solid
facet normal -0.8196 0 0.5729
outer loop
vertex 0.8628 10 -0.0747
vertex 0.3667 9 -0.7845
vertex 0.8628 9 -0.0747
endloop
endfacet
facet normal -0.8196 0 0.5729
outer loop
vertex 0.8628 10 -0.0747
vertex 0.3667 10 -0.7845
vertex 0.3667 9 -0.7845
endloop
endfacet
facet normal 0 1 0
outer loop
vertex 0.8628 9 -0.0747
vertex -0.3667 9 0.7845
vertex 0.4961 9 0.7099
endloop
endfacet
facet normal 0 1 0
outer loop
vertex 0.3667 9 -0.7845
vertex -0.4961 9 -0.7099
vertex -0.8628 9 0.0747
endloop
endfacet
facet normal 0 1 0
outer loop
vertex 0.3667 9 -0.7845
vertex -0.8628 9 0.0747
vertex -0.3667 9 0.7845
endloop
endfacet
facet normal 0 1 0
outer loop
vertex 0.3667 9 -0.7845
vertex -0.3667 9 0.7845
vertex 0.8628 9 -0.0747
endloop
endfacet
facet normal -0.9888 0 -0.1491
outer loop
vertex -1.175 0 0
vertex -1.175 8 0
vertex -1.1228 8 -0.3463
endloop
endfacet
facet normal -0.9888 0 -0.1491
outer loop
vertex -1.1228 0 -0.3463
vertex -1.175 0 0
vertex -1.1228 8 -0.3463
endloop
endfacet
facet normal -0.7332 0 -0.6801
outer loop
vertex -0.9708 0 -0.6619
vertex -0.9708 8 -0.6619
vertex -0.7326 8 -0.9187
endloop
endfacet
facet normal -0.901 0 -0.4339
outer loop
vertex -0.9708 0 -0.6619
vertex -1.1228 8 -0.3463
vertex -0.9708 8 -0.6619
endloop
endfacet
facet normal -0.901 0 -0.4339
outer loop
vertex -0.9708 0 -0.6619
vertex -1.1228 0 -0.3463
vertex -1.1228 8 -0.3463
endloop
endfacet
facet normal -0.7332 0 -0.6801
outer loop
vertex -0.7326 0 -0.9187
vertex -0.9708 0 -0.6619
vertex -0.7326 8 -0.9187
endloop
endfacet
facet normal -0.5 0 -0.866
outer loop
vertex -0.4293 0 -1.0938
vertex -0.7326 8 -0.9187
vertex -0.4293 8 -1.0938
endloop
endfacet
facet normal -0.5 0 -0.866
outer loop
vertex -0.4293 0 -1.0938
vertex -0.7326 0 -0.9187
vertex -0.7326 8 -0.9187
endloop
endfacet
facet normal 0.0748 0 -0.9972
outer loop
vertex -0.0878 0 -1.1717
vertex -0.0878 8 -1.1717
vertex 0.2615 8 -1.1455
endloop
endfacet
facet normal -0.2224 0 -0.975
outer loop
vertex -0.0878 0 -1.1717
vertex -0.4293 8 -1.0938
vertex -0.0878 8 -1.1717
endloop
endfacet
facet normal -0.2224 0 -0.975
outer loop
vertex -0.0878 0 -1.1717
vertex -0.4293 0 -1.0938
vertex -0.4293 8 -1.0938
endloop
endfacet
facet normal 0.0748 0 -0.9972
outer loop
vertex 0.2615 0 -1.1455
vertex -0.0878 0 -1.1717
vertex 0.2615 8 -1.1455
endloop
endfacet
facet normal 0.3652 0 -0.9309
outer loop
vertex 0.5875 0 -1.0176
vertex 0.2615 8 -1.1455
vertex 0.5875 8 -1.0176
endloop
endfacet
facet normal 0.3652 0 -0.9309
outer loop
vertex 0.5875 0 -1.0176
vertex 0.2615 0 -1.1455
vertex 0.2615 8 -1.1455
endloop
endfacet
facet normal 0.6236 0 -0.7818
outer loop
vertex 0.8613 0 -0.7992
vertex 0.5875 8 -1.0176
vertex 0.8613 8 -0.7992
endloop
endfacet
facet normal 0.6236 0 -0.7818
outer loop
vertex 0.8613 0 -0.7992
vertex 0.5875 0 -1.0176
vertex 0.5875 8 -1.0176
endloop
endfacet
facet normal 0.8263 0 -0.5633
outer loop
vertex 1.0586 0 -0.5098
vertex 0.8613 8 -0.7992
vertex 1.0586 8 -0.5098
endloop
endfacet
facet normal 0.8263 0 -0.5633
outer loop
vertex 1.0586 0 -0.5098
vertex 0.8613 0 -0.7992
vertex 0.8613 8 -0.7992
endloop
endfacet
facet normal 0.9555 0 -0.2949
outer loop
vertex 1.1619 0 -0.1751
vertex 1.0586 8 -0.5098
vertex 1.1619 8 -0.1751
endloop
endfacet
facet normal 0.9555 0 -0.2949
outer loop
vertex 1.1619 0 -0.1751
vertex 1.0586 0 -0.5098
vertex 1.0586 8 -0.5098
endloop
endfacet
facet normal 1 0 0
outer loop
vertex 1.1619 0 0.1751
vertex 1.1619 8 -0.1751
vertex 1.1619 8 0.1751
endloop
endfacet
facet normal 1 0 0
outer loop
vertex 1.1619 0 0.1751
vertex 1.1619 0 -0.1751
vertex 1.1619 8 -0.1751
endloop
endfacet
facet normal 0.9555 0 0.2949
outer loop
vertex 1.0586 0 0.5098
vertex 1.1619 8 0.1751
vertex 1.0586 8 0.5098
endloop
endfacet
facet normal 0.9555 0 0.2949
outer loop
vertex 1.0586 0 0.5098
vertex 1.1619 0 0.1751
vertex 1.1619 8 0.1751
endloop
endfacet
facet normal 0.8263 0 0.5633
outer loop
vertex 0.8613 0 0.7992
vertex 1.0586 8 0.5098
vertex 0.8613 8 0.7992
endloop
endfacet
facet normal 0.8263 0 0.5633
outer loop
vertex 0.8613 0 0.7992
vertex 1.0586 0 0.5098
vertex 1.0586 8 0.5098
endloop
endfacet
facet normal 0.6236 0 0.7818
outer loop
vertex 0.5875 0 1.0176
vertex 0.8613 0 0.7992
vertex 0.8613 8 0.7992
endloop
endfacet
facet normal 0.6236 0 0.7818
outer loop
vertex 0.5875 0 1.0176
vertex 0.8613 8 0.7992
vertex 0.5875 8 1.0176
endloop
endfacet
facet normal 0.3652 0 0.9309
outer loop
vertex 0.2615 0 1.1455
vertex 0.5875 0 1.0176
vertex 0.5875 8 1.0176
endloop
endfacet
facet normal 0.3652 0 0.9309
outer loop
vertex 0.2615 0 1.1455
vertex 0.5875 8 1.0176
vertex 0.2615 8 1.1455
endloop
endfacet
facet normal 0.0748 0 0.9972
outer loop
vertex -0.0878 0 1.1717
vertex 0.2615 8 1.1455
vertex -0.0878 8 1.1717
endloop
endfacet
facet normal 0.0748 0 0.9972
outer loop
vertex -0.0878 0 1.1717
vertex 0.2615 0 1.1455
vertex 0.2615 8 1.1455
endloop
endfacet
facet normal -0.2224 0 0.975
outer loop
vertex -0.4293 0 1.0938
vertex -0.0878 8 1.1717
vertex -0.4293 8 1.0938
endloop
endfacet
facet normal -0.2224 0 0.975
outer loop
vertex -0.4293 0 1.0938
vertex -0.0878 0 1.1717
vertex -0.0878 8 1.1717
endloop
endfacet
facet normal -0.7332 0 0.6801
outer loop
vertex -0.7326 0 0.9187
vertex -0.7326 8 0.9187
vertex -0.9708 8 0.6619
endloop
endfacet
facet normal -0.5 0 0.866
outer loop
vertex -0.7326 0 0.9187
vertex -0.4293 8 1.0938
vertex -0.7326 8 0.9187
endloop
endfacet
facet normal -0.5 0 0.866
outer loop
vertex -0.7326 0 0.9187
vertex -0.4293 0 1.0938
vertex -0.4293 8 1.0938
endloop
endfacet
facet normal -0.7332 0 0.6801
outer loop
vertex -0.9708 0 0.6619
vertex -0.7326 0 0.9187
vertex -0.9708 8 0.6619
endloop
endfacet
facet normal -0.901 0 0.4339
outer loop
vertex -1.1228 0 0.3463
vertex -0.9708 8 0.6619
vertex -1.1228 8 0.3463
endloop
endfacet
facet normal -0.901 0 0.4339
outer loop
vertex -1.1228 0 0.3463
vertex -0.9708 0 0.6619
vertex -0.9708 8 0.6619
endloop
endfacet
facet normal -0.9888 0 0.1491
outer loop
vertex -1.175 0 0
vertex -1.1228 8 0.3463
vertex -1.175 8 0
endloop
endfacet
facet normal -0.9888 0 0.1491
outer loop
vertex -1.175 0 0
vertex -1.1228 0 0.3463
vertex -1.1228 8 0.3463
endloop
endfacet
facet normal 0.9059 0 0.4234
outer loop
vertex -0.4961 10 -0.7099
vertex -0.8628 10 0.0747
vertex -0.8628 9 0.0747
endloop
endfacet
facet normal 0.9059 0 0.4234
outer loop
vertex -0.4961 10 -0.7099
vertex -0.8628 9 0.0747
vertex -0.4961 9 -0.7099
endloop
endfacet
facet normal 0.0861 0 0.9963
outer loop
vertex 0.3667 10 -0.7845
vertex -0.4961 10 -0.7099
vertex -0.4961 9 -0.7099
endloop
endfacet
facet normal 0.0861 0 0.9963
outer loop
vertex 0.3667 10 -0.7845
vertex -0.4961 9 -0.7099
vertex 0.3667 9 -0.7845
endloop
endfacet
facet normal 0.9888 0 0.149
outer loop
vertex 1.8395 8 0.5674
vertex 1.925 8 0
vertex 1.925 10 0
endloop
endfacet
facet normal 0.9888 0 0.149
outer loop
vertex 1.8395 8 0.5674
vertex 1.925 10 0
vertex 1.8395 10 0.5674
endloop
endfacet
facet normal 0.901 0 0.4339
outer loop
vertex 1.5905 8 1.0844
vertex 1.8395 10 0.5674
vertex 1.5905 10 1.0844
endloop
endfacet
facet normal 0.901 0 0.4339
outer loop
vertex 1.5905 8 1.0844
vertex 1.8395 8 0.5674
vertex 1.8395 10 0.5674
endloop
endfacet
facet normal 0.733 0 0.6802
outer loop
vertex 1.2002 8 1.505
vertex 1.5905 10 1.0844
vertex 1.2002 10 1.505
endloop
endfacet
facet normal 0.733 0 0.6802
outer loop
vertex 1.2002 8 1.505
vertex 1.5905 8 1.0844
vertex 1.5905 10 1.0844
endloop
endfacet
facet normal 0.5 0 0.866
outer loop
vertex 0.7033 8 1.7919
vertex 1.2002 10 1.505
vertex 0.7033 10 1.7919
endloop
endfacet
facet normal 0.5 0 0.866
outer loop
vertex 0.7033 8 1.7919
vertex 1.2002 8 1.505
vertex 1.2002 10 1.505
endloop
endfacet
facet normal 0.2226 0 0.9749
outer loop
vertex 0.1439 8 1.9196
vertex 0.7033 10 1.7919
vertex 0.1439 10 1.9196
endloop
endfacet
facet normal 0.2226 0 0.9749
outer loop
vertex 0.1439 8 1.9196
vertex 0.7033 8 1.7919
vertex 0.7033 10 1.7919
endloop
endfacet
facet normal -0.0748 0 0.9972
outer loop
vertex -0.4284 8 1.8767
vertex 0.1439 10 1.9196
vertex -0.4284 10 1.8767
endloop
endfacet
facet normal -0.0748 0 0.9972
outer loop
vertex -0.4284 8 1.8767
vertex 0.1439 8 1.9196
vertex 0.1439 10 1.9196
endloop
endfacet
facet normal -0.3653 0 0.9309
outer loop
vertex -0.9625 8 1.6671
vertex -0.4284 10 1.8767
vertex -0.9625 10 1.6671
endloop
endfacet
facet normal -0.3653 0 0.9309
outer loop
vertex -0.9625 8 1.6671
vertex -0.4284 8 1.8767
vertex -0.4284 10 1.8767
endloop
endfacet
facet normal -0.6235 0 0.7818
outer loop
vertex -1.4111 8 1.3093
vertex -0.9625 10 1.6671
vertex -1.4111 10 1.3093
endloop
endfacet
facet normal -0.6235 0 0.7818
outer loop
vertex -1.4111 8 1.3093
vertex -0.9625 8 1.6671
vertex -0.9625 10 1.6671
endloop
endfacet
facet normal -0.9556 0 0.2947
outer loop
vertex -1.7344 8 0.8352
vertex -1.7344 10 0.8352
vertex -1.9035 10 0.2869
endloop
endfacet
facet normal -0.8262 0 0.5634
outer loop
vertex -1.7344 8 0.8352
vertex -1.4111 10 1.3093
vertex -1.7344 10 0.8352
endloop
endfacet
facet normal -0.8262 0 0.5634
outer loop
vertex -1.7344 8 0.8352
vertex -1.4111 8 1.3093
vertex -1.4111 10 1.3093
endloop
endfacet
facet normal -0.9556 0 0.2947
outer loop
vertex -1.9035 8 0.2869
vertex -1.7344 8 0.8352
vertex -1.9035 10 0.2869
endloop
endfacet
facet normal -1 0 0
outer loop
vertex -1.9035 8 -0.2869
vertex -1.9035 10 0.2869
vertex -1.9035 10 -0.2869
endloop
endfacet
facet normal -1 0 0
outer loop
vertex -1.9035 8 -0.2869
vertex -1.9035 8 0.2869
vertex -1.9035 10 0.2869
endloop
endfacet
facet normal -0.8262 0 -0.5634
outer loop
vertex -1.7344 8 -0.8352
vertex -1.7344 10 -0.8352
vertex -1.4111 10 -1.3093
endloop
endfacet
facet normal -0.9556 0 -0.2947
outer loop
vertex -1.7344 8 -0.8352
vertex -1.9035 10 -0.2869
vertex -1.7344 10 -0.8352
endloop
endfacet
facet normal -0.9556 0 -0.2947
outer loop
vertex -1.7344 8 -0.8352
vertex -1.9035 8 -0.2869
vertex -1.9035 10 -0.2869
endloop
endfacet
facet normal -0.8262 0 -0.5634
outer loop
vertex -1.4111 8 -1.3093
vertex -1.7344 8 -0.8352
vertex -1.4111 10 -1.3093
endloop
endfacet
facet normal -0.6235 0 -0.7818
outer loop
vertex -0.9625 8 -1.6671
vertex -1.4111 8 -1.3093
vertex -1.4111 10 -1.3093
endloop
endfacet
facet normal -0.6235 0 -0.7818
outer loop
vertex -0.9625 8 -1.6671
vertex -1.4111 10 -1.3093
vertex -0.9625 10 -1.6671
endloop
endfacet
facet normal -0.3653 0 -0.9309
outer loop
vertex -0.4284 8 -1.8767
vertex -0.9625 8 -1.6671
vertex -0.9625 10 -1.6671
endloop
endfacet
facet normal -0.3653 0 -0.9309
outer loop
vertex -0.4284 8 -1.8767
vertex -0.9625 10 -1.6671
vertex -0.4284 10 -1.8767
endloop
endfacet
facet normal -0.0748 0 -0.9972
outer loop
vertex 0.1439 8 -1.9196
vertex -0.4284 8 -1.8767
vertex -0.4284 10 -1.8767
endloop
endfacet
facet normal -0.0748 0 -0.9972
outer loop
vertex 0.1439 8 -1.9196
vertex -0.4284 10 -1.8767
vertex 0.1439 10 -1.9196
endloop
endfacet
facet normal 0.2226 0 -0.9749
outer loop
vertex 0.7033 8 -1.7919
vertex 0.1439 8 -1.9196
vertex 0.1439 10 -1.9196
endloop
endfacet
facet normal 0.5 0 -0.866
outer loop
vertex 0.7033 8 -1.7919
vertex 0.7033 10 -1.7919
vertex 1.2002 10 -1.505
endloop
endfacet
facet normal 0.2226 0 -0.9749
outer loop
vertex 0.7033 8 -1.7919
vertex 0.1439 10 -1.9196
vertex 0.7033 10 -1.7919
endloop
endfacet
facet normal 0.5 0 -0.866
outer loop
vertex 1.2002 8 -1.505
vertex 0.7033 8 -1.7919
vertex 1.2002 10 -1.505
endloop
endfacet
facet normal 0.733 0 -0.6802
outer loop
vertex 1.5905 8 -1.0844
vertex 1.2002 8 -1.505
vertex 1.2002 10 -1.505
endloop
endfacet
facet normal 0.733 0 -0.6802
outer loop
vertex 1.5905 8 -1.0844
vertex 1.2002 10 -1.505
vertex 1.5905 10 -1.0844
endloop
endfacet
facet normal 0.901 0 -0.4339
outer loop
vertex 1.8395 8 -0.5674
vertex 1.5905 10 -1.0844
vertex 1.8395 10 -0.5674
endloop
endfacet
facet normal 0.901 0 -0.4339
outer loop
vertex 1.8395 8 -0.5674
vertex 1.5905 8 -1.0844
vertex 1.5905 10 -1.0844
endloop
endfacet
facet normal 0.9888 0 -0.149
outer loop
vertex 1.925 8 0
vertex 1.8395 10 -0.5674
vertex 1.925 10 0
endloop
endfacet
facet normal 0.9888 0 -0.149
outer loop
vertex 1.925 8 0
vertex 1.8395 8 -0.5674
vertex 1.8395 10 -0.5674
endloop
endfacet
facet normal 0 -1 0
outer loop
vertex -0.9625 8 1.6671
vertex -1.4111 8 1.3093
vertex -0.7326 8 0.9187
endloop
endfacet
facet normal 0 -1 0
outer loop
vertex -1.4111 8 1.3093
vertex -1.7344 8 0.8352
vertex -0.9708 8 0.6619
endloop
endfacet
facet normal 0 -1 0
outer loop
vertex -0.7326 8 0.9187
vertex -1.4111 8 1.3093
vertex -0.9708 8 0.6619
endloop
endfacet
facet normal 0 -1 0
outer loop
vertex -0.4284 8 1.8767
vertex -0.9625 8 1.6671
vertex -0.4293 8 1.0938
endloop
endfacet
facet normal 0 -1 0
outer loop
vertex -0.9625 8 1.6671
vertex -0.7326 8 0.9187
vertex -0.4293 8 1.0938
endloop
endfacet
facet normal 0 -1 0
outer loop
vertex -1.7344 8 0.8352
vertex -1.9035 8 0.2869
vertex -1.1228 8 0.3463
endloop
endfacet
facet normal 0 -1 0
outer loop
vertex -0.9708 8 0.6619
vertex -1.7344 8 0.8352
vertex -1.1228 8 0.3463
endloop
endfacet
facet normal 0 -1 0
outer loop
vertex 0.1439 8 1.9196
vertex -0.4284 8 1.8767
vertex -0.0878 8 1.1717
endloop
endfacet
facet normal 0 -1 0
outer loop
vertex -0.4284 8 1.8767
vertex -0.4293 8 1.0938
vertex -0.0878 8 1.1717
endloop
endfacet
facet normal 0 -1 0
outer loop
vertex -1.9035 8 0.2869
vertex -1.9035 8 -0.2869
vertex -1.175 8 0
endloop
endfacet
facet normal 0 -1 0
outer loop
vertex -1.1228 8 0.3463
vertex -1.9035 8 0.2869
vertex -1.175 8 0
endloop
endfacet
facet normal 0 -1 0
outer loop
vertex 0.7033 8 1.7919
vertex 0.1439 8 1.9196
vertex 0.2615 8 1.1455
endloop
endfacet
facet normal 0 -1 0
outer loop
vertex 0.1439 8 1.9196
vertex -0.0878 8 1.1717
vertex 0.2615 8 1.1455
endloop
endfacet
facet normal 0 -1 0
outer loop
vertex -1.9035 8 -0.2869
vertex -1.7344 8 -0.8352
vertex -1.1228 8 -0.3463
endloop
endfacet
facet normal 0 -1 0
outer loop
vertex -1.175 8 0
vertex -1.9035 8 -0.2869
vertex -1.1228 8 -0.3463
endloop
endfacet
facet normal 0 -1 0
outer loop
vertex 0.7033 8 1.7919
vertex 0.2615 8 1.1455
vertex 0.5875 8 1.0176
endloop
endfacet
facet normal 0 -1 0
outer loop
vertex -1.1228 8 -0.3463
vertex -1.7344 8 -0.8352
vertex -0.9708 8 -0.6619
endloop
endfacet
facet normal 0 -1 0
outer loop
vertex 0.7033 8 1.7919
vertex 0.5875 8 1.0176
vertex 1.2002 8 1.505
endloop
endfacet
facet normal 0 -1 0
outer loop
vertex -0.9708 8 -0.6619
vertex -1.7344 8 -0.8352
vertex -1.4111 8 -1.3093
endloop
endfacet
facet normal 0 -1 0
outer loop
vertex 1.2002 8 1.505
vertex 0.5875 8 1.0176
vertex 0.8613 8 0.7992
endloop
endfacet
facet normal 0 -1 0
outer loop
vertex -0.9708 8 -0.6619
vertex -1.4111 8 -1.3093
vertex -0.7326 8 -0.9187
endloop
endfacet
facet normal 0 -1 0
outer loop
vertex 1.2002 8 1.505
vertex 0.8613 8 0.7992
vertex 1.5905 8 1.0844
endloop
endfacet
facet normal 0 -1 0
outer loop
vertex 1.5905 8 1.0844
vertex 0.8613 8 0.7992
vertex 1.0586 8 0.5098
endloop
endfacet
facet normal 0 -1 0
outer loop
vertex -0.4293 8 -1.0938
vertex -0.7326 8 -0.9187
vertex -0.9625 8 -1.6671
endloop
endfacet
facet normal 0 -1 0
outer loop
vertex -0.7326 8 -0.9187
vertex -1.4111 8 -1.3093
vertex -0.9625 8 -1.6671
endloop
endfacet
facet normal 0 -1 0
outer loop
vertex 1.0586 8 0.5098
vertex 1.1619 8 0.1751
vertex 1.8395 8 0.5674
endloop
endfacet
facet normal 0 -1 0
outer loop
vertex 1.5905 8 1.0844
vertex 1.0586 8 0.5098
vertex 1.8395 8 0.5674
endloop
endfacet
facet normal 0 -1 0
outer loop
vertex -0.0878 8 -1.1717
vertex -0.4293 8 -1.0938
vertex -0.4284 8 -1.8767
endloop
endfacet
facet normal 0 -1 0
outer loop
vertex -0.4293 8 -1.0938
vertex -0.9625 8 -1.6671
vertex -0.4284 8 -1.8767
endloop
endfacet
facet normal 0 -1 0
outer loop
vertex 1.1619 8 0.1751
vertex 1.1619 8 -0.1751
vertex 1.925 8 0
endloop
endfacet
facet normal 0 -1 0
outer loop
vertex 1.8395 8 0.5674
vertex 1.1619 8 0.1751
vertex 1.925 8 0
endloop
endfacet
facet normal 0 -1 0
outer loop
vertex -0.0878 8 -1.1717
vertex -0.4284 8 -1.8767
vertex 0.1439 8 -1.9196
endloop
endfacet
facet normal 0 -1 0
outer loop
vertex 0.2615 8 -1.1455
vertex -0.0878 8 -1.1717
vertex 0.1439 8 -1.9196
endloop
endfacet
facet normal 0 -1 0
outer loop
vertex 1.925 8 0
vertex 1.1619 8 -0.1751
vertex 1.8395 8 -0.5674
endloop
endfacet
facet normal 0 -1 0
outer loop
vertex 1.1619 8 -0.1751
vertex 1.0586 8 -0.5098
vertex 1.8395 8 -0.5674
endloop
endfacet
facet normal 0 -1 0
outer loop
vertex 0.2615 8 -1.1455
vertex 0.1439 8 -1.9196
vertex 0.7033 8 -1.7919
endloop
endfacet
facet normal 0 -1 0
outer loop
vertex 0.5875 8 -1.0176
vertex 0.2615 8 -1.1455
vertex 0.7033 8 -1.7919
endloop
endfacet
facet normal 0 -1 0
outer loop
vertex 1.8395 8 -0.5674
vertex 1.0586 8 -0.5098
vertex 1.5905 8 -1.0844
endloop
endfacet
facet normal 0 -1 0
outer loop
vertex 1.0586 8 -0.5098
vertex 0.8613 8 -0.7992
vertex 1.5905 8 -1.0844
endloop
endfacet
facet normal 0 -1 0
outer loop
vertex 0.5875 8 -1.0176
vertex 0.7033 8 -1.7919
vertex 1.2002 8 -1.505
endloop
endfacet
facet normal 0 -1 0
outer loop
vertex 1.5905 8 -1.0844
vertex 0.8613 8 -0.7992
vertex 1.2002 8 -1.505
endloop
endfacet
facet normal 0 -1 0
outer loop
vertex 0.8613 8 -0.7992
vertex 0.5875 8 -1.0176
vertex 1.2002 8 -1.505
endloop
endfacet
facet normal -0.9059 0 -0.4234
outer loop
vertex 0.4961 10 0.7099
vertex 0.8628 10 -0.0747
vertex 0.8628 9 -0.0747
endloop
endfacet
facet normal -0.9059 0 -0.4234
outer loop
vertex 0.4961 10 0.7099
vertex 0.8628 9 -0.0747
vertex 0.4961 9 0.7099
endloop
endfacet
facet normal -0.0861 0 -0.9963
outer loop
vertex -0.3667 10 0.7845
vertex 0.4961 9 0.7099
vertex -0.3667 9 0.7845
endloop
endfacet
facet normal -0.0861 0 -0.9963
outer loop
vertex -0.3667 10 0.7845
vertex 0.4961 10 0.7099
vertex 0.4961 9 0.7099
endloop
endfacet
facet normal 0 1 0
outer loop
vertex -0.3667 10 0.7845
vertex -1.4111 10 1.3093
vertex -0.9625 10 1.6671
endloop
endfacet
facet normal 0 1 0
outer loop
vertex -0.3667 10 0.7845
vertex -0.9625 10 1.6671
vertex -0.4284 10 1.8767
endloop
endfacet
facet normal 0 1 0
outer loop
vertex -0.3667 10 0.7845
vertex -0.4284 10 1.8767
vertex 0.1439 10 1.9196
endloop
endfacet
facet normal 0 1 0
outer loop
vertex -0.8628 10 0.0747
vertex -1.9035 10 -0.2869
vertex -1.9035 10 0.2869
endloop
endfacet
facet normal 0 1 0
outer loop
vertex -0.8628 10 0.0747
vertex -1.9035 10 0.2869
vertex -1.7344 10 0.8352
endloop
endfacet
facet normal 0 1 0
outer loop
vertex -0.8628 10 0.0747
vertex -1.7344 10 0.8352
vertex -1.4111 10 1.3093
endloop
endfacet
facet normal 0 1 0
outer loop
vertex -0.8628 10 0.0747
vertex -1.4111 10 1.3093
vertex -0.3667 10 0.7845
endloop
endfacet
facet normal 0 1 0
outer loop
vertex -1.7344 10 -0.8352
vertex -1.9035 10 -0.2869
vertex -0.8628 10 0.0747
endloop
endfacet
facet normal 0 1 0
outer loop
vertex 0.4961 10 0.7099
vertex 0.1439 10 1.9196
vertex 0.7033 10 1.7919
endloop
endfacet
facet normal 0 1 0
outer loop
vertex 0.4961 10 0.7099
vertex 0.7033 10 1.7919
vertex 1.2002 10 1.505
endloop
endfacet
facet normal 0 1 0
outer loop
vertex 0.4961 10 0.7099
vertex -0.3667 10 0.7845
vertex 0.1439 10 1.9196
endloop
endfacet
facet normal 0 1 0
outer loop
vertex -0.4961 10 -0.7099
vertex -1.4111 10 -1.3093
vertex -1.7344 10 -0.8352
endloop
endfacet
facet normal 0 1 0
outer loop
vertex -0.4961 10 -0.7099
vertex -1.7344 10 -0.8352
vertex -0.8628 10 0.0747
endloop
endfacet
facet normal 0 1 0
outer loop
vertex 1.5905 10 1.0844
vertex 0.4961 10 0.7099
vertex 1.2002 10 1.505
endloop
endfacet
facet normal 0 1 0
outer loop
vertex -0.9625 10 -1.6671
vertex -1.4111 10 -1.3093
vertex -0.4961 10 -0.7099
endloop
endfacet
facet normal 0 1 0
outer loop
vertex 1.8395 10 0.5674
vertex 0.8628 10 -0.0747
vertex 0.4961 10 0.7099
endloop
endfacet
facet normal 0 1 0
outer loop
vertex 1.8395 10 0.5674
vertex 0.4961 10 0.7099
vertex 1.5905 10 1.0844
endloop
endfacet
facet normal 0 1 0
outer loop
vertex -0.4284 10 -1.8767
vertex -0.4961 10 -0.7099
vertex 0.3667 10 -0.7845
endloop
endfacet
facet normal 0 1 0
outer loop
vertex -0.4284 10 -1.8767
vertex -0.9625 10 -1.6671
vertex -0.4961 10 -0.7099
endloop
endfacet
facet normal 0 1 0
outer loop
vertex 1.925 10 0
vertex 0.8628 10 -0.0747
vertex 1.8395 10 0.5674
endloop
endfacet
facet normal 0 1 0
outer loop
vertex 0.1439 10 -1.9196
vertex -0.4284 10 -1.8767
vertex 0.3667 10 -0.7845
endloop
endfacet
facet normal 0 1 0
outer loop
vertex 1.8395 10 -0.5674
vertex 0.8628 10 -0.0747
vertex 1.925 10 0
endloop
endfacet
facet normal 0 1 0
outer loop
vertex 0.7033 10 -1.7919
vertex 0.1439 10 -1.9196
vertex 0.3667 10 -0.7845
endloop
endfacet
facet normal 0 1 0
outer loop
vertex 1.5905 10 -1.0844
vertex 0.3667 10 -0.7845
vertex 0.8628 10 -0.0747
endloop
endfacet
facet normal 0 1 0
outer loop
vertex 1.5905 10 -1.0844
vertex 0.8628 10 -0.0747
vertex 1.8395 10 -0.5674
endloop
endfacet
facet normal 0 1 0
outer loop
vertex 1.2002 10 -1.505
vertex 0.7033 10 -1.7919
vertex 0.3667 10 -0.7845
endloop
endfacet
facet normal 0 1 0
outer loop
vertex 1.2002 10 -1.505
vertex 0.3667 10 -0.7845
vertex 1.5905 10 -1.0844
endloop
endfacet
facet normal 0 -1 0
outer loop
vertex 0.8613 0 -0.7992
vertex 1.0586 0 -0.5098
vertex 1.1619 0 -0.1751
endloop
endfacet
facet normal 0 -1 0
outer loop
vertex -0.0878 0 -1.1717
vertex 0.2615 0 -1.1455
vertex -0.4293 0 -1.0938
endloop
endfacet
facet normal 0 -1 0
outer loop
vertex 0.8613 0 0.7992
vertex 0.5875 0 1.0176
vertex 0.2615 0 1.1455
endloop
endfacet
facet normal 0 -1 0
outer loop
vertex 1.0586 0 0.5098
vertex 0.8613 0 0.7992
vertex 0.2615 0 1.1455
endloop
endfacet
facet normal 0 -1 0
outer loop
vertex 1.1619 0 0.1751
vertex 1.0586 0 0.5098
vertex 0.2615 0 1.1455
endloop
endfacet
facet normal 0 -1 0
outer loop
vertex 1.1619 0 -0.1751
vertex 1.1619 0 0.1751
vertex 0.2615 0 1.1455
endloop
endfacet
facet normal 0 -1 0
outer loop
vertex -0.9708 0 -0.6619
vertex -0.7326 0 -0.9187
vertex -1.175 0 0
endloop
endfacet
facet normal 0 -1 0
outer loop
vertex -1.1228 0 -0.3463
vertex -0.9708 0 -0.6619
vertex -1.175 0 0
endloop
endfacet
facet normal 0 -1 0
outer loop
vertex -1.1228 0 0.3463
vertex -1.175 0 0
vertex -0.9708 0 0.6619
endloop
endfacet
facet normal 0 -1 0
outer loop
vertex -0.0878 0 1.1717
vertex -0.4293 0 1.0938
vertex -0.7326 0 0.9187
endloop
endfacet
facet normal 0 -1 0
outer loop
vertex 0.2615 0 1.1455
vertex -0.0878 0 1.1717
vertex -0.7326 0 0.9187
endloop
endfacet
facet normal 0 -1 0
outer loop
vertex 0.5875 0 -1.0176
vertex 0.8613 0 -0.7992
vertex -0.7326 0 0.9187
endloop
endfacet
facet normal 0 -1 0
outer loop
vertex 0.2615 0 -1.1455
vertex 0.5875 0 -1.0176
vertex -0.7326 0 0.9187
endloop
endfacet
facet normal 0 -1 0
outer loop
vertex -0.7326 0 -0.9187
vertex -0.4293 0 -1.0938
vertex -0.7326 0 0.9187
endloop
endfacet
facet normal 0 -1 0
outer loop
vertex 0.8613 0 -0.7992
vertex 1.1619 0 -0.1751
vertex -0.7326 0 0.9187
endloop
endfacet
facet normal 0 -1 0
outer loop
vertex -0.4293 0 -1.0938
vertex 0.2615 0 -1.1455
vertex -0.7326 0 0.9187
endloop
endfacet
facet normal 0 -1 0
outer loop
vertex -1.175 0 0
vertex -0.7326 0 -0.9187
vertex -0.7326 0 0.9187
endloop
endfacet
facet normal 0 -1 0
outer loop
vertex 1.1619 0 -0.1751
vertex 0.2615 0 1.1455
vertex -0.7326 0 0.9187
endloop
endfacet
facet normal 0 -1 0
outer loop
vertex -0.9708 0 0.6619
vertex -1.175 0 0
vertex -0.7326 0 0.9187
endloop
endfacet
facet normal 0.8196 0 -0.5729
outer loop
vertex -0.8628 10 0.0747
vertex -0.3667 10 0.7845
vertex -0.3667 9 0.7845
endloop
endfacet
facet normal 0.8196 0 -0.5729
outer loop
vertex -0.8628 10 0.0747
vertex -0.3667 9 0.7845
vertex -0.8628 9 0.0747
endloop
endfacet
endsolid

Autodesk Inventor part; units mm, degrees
ref_plane "YZ Plane" through (0, 0, 0) normal (1, 0, 0) x (0, 1, 0)
ref_plane "XZ Plane" through (0, 0, 0) normal (0, 1, 0) x (-1, 0, 0)
ref_plane "XY Plane" through (0, 0, 0) normal (0, 0, 1) x (1, 0, 0)
sketch "Sketch1" plane through (0, 0, 0) normal (0, 1, 0) x (-1, 0, 0)
  circle A0 centre (0, 0) radius 1.175
  dimension "d0" = 2.35
extrude "Extrusion1" add sketch "Sketch1" along normal blind 8
sketch "Sketch2" plane through (0, 8, 0) normal (0, 1, 0) x (1, 0, 0)
  circle A0 centre (0, 0) radius 1.175 projected
  circle A1 centre (0, 0) radius 1.925
  dimension "d3" = 3.85
extrude "Extrusion2" add sketch "Sketch2" along normal blind 2 contours A0 | A1
sketch "Sketch3" plane through (0, 10, 0) normal (0, 1, 0) x (1, 0, 0)
  line L0 (-0.4961, 0.7099) -> (0.3667, 0.7845)
  line L1 (0.3667, 0.7845) -> (0.8628, 0.0747)
  line L2 (0.8628, 0.0747) -> (0.4961, -0.7099)
  line L3 (0.4961, -0.7099) -> (-0.3667, -0.7845)
  line L4 (-0.3667, -0.7845) -> (-0.8628, -0.0747)
  line L5 (-0.8628, -0.0747) -> (-0.4961, 0.7099)
  point P0 (0, 0)
  point P1 (0, 0)
  dimension "d6" = 1.5
extrude "Extrusion3" cut sketch "Sketch3" against normal blind 1
equation "\"d0\" = M2_A"
equation "\"d3\" = M2_B"
equation "\"M2_A\" = 2.35"
equation "\"M2_B\" = 3.85"
properties part number "M2_SCREW_8MM"
